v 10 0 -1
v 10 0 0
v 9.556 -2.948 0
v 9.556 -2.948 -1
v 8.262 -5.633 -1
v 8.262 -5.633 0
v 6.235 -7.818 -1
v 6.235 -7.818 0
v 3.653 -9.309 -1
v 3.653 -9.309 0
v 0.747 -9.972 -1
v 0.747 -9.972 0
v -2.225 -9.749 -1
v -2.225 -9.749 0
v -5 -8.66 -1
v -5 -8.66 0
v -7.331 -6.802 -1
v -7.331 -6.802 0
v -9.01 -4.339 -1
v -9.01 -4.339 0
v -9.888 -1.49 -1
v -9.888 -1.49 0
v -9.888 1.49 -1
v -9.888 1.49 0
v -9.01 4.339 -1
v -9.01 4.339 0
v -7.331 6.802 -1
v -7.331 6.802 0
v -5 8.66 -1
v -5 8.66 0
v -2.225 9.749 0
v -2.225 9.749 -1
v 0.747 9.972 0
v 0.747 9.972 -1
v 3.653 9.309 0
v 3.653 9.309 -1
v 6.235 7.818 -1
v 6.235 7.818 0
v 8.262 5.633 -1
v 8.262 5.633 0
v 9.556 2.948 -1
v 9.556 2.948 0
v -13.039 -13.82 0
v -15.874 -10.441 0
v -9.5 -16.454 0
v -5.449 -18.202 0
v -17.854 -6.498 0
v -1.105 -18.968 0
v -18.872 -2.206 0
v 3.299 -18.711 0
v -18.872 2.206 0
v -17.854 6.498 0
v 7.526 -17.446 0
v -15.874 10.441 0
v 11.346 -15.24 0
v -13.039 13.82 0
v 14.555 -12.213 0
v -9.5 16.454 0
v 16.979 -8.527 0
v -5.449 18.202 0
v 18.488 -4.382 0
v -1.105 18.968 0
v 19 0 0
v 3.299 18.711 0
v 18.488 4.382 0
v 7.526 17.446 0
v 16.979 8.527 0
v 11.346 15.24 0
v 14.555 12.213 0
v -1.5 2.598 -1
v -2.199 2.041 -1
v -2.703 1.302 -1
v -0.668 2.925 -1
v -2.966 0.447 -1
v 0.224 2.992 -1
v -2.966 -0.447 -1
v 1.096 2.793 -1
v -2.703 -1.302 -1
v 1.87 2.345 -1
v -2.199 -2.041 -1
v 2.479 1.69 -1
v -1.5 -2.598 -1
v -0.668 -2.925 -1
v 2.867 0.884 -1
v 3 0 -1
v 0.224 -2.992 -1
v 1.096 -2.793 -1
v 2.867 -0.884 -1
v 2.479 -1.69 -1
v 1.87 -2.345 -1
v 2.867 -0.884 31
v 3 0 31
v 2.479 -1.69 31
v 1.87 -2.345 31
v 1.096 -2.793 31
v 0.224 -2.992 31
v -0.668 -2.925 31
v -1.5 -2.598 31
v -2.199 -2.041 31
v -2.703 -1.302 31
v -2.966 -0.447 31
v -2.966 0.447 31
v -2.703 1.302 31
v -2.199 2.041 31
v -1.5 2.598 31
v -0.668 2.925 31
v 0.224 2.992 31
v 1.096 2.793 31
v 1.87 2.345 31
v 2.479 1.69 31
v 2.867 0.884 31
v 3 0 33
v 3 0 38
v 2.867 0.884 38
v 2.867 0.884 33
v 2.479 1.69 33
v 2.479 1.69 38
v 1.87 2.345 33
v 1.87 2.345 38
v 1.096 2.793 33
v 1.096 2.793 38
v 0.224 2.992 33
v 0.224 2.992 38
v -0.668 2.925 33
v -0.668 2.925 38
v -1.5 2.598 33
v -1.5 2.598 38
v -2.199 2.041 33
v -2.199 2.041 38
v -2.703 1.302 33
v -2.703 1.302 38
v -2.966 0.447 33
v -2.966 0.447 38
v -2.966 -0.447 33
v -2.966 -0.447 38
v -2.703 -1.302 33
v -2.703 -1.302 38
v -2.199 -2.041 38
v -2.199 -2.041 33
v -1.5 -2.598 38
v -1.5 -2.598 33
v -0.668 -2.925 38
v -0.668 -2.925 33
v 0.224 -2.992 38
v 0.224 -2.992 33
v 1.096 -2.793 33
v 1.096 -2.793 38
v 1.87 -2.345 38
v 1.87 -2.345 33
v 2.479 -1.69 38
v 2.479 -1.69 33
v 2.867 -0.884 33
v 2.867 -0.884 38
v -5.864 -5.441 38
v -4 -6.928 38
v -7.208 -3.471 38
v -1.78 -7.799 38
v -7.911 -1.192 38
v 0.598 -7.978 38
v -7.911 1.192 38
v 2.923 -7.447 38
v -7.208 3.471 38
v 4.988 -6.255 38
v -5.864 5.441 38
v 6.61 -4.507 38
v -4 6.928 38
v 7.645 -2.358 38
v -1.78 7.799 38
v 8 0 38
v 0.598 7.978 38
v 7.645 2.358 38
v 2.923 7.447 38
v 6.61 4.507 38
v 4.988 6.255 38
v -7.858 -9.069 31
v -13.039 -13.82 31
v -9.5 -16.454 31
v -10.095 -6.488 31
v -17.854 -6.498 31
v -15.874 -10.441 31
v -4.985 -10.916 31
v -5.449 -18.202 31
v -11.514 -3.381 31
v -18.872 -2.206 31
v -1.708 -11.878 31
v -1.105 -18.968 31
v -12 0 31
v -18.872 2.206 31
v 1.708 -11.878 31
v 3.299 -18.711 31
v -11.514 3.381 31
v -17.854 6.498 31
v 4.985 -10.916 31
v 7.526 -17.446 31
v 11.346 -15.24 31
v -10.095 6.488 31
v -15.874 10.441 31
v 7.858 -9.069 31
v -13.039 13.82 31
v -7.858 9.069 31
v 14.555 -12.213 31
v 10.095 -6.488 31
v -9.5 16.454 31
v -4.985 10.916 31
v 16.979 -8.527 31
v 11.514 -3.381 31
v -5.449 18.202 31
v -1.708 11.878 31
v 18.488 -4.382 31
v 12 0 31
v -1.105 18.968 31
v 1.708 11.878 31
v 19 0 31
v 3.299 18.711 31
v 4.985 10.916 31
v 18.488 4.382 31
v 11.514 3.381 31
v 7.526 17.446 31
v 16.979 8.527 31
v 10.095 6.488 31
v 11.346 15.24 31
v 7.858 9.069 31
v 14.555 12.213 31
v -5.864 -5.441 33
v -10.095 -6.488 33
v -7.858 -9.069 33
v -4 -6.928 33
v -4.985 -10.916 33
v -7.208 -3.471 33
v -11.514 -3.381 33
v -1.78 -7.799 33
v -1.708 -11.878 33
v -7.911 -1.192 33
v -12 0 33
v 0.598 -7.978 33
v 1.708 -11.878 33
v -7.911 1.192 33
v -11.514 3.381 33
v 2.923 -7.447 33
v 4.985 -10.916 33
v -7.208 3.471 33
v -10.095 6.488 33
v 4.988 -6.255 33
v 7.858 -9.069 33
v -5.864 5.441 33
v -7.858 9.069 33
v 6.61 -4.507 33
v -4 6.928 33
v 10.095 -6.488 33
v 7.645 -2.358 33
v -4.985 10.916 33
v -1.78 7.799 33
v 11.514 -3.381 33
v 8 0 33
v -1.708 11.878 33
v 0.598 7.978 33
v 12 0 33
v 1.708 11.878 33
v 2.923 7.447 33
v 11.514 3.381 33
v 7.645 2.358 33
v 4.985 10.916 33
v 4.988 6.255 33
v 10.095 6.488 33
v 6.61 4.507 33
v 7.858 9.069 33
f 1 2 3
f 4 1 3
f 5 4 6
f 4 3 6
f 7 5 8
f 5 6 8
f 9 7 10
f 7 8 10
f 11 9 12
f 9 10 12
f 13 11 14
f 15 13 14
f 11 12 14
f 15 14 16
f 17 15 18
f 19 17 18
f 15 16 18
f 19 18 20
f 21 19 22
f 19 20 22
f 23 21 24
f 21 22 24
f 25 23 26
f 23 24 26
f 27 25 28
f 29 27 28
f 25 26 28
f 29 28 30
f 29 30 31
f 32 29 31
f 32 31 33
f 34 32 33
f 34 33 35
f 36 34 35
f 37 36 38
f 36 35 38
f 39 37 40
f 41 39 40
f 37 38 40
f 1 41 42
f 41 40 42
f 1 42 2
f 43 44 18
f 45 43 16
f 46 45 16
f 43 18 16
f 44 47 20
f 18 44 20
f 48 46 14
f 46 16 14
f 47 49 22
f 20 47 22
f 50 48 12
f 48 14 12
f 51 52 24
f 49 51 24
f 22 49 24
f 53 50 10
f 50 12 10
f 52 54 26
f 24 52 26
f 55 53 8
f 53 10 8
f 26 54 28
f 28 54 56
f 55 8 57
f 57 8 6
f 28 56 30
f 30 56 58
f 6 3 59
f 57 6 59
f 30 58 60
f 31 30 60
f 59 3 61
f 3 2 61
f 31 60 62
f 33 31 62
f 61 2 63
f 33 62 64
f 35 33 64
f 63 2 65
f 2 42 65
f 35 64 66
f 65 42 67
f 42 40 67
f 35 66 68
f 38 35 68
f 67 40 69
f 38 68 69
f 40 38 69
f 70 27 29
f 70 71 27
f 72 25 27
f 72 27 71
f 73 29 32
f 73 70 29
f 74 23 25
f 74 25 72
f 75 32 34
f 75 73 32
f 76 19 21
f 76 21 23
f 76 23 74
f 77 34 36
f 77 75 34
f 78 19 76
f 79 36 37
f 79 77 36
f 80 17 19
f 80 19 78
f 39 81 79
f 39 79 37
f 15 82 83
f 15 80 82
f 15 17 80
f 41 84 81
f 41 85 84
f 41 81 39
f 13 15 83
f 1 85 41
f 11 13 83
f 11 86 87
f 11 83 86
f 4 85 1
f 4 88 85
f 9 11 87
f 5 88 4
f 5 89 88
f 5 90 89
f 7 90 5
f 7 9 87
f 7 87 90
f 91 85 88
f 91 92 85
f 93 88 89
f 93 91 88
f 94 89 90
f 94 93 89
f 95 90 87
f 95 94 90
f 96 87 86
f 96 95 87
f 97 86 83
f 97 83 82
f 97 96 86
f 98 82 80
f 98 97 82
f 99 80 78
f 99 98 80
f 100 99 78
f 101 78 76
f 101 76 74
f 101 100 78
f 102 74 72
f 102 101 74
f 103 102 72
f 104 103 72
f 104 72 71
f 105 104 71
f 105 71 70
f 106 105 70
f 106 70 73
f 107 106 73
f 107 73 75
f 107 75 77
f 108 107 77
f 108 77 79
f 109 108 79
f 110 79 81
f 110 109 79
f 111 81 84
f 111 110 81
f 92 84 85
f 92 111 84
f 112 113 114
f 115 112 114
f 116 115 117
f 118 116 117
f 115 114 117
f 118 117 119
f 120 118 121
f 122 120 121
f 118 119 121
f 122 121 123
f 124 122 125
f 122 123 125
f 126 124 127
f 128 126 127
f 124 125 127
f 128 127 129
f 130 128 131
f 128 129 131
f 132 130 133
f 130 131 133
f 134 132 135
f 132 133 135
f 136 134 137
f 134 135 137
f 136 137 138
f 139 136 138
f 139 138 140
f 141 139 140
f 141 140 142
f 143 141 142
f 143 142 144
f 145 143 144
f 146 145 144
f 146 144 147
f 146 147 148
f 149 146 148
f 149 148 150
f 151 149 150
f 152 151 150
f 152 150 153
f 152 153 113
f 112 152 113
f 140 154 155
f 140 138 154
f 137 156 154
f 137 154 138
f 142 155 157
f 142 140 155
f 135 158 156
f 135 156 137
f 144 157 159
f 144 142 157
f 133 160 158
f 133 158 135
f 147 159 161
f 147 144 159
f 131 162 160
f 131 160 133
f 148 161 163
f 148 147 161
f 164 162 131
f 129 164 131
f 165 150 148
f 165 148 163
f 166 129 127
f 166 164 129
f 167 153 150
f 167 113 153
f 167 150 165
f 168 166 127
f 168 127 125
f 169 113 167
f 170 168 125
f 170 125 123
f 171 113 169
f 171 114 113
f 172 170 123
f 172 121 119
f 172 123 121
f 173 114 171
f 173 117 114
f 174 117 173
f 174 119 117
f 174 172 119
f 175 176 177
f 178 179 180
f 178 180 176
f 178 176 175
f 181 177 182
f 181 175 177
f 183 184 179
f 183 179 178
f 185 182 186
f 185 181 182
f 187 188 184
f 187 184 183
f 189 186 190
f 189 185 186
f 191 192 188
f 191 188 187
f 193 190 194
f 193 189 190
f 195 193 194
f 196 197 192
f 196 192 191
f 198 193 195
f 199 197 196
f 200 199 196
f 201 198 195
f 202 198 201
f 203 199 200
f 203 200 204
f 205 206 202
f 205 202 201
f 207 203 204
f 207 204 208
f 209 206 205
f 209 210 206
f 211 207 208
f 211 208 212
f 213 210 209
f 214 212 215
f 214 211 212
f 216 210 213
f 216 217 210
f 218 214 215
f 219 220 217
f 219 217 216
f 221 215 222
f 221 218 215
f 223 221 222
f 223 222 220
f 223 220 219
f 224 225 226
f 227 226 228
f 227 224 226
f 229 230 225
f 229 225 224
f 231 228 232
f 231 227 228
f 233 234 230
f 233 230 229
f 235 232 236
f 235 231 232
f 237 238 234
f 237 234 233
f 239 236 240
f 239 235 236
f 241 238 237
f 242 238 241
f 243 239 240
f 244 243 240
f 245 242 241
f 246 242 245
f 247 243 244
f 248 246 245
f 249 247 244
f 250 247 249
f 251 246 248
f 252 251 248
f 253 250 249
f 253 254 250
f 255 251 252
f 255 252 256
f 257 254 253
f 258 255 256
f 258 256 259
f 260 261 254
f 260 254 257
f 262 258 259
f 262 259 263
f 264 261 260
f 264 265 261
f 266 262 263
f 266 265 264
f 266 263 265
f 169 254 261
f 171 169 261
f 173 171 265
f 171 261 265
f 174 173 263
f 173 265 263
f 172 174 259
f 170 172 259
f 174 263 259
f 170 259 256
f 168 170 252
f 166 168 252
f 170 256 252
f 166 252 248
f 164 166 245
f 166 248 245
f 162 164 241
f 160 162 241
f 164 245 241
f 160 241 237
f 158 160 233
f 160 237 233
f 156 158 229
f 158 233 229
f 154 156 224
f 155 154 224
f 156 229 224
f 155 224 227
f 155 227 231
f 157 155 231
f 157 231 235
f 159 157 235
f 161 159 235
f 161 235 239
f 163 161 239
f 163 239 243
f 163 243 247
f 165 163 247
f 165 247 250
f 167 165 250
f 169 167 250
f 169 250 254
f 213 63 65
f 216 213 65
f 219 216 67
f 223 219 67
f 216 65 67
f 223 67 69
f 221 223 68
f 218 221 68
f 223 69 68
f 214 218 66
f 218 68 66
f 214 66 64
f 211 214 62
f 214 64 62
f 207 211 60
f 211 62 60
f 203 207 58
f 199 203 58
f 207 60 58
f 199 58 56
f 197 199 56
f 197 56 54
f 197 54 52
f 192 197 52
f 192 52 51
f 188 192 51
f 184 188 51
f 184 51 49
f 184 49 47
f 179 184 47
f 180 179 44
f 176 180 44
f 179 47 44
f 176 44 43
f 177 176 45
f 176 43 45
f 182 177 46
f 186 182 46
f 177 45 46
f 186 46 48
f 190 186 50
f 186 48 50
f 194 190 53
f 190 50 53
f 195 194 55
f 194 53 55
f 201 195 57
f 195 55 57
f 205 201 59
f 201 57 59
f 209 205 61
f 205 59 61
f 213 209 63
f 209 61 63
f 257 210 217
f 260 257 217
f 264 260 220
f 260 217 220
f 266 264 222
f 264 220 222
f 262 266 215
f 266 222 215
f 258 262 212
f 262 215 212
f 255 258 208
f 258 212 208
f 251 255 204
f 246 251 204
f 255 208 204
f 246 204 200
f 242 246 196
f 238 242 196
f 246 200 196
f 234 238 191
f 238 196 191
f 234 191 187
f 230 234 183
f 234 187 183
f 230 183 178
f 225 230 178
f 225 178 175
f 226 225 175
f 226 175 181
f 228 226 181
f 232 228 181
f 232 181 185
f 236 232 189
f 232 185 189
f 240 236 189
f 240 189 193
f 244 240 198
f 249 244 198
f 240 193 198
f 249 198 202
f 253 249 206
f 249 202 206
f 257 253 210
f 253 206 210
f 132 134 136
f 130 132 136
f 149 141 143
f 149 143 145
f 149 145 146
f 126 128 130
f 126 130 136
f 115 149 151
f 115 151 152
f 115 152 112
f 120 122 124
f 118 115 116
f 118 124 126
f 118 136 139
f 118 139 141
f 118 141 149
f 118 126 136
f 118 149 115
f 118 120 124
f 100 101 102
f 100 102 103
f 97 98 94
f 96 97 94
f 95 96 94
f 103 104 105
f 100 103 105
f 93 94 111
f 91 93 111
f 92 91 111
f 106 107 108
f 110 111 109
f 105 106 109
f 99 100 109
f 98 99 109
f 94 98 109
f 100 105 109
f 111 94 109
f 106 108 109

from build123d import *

# Parameters (mm, degrees)
SKETCH_1_R          = 19
EXTRUDE_1_DEPTH     = 31
SKETCH_2_R          = 8
EXTRUDE_2_DEPTH     = 7
SKETCH_3_R          = 3
CUT_EXTRUDE_1_DEPTH = 47.540305113
SKETCH_4_R          = 12
EXTRUDE_3_DEPTH     = 2
SKETCH_5_R          = 10
SKETCH_5_R_2        = 3
EXTRUDE_4_DEPTH     = 1


with BuildPart() as part:
    # 草图1 → 凸台-拉伸1 (new body)
    with BuildSketch(Plane.XY):
        Circle(SKETCH_1_R)
    extrude(amount=EXTRUDE_1_DEPTH)

    # 草图2 → 凸台-拉伸2 (add)
    with BuildSketch(Plane.XY.offset(31)):
        Circle(SKETCH_2_R)
    extrude(amount=EXTRUDE_2_DEPTH)

    # 草图3 → 切除-拉伸1 (cut, through all)
    with BuildSketch(Plane.XY.offset(38)):
        Circle(SKETCH_3_R)
    extrude(amount=-CUT_EXTRUDE_1_DEPTH, mode=Mode.SUBTRACT)

    # 草图4 → 凸台-拉伸3 (add)
    with BuildSketch(Plane.XY.offset(31)):
        Circle(SKETCH_4_R)
    extrude(amount=EXTRUDE_3_DEPTH)

    # 草图5 → 凸台-拉伸4 (add)
    with BuildSketch(Plane(origin=(0, 0, 0), x_dir=(-1, 0, 0), z_dir=(0, 0, -1))):
        with Locations(Location((0, 0, 0), (0, 0, 180))):
            Circle(SKETCH_5_R)
        with Locations(Location((0, 0, 0), (0, 0, 180))):
            Circle(SKETCH_5_R_2, mode=Mode.SUBTRACT)
    extrude(amount=EXTRUDE_4_DEPTH)


solid = part.part
